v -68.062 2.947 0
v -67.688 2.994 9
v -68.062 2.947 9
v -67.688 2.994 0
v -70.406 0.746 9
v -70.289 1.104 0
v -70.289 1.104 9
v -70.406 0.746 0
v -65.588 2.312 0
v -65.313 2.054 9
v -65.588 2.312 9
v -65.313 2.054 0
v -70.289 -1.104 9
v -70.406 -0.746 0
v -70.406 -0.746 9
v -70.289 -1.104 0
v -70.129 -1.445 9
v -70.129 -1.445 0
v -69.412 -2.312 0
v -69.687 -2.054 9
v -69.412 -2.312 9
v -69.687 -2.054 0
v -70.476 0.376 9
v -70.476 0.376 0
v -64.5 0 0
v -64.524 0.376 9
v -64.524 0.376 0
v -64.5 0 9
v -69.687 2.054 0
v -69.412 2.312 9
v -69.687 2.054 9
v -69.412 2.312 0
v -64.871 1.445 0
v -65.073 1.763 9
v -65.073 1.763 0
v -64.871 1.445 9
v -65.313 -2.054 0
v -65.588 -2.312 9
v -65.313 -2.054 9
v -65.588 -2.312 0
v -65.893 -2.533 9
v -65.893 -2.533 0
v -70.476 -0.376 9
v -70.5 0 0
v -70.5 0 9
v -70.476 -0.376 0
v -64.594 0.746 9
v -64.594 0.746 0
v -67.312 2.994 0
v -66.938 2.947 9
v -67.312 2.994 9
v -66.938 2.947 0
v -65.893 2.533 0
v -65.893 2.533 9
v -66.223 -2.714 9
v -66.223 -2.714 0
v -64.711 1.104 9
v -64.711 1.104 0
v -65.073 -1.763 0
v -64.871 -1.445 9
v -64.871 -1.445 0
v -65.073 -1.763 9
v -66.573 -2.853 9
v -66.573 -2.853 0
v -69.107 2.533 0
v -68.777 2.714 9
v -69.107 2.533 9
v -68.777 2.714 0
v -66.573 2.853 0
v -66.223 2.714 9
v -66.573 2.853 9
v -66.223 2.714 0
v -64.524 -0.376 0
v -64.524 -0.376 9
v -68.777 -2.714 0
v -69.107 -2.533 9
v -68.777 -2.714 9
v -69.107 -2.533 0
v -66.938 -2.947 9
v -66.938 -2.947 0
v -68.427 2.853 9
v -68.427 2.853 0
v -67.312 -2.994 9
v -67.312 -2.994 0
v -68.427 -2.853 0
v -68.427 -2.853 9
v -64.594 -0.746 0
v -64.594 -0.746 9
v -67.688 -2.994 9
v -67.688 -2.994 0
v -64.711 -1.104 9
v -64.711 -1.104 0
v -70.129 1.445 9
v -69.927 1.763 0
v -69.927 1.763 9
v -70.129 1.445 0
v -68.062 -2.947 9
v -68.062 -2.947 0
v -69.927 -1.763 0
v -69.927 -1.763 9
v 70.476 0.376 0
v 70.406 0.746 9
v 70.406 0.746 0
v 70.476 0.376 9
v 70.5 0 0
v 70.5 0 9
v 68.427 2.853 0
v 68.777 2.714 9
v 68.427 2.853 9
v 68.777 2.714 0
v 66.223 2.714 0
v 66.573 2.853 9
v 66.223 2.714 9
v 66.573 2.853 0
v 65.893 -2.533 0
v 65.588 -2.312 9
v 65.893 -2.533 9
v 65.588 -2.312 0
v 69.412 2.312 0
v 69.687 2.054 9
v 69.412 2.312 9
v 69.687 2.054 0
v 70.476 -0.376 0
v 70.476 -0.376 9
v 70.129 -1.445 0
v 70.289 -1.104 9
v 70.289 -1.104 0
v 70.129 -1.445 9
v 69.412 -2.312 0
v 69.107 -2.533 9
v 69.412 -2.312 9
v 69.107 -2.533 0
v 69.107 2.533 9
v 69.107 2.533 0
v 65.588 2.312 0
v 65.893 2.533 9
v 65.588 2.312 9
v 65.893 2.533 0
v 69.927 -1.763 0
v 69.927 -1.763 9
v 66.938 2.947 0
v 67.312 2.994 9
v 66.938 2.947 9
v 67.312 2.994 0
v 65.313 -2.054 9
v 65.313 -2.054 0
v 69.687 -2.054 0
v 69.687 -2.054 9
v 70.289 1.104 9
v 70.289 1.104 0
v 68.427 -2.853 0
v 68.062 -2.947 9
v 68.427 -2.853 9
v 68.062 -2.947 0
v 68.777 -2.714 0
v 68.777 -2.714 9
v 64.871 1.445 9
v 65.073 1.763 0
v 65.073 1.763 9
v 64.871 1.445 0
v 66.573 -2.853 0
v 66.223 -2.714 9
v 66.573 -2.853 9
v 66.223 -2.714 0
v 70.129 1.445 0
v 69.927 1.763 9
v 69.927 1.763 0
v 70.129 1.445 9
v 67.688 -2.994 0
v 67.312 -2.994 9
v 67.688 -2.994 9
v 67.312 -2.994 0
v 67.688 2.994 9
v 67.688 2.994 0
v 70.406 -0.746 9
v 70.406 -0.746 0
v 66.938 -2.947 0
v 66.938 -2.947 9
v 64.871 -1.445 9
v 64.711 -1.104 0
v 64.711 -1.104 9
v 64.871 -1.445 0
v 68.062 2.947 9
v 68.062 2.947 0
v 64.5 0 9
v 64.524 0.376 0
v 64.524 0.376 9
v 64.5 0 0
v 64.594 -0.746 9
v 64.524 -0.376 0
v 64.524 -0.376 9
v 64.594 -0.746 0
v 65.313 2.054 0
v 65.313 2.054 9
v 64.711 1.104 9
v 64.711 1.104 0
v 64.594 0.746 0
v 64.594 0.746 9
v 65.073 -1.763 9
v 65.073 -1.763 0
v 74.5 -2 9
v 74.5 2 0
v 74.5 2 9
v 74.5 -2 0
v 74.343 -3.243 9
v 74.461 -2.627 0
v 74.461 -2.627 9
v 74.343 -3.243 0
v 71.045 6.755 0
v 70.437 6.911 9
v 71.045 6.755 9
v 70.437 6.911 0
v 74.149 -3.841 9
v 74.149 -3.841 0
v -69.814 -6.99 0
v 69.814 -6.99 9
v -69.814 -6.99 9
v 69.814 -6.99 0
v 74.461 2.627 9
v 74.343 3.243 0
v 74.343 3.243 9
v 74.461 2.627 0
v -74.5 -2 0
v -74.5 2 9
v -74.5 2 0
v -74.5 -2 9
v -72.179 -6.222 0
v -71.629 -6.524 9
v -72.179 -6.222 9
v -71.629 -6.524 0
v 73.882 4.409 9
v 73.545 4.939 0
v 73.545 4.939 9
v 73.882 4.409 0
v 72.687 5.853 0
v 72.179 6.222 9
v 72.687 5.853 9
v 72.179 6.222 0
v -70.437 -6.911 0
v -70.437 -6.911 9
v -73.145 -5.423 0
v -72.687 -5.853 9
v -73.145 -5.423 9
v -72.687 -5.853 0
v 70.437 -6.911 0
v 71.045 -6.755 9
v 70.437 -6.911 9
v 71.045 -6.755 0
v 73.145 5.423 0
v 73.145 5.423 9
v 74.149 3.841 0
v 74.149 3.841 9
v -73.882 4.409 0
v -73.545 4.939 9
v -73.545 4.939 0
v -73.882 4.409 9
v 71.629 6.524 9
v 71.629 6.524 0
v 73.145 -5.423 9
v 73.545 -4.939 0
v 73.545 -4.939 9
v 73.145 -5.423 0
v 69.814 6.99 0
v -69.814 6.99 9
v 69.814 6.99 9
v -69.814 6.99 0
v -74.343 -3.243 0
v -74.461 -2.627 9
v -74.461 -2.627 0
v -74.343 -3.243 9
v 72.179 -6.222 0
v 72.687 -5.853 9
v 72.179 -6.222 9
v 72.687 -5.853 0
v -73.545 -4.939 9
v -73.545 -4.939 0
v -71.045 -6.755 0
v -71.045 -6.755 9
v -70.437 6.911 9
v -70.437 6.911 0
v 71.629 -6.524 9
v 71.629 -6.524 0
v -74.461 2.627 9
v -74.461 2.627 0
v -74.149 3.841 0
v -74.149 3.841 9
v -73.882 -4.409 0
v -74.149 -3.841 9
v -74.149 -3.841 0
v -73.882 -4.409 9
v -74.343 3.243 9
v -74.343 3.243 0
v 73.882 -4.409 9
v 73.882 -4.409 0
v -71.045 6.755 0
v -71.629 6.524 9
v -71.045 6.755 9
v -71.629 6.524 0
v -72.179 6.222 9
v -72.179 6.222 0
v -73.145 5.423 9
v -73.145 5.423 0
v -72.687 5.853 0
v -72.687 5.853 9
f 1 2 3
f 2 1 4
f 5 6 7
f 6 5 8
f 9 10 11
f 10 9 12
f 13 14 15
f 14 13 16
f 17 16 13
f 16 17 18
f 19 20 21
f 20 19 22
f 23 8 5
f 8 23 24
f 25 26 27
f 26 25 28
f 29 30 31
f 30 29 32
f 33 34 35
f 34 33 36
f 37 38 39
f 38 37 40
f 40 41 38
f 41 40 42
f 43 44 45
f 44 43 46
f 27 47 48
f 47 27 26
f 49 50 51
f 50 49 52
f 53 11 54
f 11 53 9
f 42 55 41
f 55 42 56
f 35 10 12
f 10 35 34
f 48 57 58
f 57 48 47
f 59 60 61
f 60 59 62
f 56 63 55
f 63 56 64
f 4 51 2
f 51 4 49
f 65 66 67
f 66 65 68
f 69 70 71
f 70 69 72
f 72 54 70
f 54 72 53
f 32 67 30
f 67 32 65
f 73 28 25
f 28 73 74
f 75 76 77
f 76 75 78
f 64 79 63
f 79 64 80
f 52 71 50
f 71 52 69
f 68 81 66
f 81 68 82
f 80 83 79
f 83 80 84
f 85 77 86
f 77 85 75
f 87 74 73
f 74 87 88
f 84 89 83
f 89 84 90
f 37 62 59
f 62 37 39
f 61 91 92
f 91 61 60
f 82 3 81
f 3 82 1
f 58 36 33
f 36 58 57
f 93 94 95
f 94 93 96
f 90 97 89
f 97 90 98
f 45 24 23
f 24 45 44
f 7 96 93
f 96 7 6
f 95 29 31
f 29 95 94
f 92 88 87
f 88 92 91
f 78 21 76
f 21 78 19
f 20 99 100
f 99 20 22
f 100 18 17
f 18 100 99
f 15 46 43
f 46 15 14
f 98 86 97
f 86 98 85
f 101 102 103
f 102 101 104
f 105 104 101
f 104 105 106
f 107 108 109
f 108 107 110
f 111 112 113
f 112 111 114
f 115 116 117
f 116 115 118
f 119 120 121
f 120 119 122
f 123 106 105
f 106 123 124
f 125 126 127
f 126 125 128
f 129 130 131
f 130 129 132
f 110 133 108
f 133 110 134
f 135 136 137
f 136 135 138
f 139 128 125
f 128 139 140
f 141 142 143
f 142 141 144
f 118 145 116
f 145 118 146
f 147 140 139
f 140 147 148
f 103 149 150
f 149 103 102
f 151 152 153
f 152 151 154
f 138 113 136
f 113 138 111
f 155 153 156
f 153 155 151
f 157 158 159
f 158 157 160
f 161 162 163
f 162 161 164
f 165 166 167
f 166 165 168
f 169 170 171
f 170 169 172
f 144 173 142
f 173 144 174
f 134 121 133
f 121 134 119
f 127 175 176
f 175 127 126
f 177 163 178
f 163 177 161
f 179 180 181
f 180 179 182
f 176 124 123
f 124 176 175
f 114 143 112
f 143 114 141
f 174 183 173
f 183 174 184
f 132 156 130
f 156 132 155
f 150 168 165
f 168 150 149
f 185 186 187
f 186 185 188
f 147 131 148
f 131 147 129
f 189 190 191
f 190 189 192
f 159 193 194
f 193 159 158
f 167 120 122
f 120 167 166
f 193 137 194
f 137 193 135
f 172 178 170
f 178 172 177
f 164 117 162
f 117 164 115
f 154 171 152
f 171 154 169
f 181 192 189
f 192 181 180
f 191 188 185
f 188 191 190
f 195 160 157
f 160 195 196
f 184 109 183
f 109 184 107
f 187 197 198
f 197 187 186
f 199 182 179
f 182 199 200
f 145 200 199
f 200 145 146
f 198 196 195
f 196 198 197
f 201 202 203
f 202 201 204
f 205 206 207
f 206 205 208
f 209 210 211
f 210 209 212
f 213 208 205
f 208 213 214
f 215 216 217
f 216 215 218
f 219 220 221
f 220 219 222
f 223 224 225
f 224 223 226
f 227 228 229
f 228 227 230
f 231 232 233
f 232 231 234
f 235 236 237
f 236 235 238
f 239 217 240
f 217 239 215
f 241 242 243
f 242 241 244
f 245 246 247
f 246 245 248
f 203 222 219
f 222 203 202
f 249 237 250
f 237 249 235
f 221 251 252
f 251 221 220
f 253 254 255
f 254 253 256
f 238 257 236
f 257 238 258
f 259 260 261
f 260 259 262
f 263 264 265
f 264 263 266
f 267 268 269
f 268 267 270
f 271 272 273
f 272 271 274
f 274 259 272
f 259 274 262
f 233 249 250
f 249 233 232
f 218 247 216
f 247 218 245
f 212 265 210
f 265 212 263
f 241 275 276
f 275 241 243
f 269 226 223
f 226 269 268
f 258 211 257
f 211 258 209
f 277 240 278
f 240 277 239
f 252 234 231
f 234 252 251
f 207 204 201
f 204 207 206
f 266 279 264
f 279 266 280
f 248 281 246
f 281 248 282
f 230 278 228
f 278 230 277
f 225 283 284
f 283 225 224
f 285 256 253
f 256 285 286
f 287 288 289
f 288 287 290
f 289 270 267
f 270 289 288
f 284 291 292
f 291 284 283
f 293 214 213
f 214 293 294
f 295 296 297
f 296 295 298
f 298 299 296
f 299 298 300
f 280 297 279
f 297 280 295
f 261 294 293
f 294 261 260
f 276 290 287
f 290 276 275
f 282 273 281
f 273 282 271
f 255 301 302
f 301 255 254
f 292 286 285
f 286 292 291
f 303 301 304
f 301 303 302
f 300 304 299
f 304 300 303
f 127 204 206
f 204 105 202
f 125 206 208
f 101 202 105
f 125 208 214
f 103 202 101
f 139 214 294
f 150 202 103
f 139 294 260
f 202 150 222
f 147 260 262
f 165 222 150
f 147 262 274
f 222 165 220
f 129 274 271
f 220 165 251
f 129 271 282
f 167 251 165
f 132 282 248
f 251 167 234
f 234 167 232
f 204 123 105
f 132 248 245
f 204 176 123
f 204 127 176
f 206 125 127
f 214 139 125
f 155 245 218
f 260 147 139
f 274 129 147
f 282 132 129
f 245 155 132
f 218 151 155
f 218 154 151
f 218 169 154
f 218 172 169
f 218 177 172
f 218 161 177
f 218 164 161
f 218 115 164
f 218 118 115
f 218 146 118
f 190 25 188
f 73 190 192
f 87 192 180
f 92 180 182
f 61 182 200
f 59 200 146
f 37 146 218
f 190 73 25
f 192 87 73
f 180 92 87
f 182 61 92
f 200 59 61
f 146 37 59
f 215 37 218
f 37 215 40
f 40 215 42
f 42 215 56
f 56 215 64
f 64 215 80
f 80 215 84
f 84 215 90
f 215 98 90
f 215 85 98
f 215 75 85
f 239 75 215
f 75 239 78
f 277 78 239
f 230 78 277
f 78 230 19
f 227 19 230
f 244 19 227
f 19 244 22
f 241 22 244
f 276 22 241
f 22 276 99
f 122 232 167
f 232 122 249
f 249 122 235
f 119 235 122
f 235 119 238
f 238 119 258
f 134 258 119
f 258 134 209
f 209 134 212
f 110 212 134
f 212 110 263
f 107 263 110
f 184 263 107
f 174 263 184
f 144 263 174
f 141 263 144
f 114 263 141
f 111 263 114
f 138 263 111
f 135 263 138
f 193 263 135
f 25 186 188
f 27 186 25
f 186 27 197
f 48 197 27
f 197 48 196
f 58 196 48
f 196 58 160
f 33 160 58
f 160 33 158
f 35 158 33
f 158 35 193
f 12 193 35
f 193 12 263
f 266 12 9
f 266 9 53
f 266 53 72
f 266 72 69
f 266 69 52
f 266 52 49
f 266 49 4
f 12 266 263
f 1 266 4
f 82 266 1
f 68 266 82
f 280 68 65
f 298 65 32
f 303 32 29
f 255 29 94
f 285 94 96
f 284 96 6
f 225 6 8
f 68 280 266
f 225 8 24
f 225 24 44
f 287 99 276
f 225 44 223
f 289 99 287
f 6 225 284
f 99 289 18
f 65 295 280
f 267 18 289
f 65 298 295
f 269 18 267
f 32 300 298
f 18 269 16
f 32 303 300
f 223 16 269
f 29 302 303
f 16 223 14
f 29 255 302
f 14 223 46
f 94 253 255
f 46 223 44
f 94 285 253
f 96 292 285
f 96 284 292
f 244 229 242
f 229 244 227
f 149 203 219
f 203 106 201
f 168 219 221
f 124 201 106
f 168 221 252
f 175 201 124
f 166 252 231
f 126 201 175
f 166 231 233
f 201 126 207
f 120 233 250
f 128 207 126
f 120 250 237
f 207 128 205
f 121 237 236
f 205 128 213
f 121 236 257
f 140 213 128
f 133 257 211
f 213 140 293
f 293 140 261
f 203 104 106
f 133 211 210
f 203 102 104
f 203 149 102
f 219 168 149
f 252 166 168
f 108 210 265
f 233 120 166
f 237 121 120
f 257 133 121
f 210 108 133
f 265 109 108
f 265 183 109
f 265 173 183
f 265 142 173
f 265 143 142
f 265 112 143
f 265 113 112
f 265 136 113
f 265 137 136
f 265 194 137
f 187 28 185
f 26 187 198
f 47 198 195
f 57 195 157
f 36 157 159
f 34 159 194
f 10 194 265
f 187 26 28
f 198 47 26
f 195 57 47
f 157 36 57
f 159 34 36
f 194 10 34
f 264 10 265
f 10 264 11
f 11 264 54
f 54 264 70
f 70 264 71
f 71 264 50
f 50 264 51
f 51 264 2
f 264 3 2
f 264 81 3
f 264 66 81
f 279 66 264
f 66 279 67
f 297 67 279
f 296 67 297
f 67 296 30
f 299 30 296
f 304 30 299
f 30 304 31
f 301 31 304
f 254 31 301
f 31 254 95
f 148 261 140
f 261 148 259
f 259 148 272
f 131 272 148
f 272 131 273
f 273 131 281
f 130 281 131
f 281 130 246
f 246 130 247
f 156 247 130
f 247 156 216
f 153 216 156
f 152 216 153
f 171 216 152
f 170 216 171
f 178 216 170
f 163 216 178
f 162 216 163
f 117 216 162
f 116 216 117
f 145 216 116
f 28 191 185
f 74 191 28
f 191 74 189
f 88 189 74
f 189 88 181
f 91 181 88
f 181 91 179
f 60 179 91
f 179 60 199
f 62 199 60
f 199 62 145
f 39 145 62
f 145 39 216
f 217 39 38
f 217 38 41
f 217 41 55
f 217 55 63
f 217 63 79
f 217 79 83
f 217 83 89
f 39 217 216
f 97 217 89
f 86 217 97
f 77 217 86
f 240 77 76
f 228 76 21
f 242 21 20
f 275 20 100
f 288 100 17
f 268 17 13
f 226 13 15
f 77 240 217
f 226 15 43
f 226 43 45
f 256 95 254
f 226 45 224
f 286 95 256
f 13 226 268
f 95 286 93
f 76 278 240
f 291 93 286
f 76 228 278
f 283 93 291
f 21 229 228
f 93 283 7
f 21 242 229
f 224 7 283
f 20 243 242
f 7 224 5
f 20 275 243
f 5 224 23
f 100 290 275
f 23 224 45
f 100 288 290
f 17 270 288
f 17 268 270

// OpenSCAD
$fn = 50;


difference() {
	union() {
		hull() {
			translate(v = [-69.5000000000, 2.0000000000, 0]) {
				cylinder(h = 9, r = 5);
			}
			translate(v = [69.5000000000, 2.0000000000, 0]) {
				cylinder(h = 9, r = 5);
			}
			translate(v = [-69.5000000000, -2.0000000000, 0]) {
				cylinder(h = 9, r = 5);
			}
			translate(v = [69.5000000000, -2.0000000000, 0]) {
				cylinder(h = 9, r = 5);
			}
		}
	}
	union() {
		translate(v = [-67.5000000000, 0.0000000000, -100.0000000000]) {
			cylinder(h = 200, r = 3.0000000000);
		}
		translate(v = [-67.5000000000, 0.0000000000, -100.0000000000]) {
			cylinder(h = 200, r = 3.0000000000);
		}
		translate(v = [67.5000000000, 0.0000000000, -100.0000000000]) {
			cylinder(h = 200, r = 3.0000000000);
		}
		translate(v = [67.5000000000, 0.0000000000, -100.0000000000]) {
			cylinder(h = 200, r = 3.0000000000);
		}
	}
}
